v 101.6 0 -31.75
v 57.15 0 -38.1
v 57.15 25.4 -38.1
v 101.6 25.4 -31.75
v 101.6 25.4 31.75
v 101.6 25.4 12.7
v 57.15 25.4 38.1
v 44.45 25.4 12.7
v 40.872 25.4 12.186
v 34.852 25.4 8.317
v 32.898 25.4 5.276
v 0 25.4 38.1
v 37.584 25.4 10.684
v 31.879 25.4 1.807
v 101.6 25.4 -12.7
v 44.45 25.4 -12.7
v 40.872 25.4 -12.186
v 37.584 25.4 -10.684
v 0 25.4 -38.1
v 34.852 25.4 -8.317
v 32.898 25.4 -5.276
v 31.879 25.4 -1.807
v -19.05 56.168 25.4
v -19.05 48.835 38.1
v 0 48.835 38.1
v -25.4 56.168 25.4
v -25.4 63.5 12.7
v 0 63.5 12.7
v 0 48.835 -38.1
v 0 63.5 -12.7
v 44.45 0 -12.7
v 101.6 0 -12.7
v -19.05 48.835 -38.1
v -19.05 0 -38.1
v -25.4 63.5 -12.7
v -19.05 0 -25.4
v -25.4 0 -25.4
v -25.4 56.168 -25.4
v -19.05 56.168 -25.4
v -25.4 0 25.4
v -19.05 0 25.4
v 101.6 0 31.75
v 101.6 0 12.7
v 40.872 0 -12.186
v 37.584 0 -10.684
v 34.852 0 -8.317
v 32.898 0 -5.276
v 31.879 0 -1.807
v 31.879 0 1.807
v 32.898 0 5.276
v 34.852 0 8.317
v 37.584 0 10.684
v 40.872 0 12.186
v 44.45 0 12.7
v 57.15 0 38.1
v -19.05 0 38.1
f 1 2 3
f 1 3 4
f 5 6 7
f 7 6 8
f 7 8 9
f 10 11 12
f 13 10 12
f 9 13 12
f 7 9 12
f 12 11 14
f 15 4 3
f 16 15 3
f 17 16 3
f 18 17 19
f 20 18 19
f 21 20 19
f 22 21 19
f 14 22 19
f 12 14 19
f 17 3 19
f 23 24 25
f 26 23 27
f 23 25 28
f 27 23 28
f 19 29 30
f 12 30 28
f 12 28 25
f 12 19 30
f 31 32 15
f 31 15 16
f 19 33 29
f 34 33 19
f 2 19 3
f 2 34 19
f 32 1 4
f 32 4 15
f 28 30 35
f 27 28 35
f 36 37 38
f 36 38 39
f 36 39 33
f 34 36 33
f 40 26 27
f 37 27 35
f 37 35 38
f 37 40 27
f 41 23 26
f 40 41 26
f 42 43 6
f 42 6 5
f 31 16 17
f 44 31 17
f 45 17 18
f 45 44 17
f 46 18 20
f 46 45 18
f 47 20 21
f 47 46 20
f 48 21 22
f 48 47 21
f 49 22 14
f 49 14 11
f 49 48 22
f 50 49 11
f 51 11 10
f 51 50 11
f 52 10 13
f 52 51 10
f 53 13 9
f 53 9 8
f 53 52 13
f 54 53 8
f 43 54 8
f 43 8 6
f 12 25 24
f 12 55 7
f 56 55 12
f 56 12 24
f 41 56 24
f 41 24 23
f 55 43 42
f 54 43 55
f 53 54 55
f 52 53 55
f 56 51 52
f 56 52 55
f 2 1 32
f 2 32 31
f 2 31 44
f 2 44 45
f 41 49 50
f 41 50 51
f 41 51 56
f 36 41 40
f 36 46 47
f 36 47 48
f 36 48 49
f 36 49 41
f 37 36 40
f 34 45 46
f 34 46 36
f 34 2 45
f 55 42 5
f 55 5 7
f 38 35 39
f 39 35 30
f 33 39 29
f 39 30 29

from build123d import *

# Parameters (mm, degrees)
EXTRUDE_1_DEPTH     = 25.4
EXTRUDE_2_DEPTH     = 63.5
CUT_EXTRUDE_1_DEPTH = 63.5


with BuildPart() as part:
    # 草图2 → 凸台-拉伸1 (new body)
    with BuildSketch(Plane(origin=(0, 0, 0), x_dir=(1, 0, 0), z_dir=(0, 1, 0))):
        with BuildLine():
            Line((0, 0), (0, 38.1))
            Line((0, 38.1), (57.15, 38.1))
            Line((57.15, 38.1), (101.6, 31.75))
            Line((101.6, 31.75), (101.6, 12.7))
            Line((101.6, 12.7), (44.45, 12.7))
            ThreePointArc((44.45, 12.7), (31.75, 0), (44.45, -12.7))
            Line((44.45, -12.7), (101.6, -12.7))
            Line((101.6, -12.7), (101.6, -31.75))
            Line((101.6, -31.75), (57.15, -38.1))
            Line((57.15, -38.1), (0, -38.1))
            Line((0, -38.1), (0, 0))
        make_face()
    extrude(amount=EXTRUDE_1_DEPTH)

    # 草图4 → 凸台-拉伸2 (add)
    with BuildSketch(Plane(origin=(0, 0, 0), x_dir=(-1, 0, 0), z_dir=(0, -1, 0))):
        Polygon((0, 38.1), (0, -38.1), (19.05, -38.1), (19.05, -25.4), (25.4, -25.4), (25.4, 25.4), (19.05, 25.4), (19.05, 38.1), align=None)
    extrude(amount=-EXTRUDE_2_DEPTH)

    # 草图5 → 切除-拉伸1 (cut)
    with BuildSketch(Plane(origin=(0, 0, 0), x_dir=(0, 0, -1), z_dir=(1, 0, 0))):
        Polygon((-38.1, 63.5), (-38.1, 48.835303163), (-12.7, 63.5), align=None)
        Polygon((38.1, 63.5), (12.7, 63.5), (38.1, 48.835303163), align=None)
    extrude(amount=-CUT_EXTRUDE_1_DEPTH, mode=Mode.SUBTRACT)


solid = part.part
